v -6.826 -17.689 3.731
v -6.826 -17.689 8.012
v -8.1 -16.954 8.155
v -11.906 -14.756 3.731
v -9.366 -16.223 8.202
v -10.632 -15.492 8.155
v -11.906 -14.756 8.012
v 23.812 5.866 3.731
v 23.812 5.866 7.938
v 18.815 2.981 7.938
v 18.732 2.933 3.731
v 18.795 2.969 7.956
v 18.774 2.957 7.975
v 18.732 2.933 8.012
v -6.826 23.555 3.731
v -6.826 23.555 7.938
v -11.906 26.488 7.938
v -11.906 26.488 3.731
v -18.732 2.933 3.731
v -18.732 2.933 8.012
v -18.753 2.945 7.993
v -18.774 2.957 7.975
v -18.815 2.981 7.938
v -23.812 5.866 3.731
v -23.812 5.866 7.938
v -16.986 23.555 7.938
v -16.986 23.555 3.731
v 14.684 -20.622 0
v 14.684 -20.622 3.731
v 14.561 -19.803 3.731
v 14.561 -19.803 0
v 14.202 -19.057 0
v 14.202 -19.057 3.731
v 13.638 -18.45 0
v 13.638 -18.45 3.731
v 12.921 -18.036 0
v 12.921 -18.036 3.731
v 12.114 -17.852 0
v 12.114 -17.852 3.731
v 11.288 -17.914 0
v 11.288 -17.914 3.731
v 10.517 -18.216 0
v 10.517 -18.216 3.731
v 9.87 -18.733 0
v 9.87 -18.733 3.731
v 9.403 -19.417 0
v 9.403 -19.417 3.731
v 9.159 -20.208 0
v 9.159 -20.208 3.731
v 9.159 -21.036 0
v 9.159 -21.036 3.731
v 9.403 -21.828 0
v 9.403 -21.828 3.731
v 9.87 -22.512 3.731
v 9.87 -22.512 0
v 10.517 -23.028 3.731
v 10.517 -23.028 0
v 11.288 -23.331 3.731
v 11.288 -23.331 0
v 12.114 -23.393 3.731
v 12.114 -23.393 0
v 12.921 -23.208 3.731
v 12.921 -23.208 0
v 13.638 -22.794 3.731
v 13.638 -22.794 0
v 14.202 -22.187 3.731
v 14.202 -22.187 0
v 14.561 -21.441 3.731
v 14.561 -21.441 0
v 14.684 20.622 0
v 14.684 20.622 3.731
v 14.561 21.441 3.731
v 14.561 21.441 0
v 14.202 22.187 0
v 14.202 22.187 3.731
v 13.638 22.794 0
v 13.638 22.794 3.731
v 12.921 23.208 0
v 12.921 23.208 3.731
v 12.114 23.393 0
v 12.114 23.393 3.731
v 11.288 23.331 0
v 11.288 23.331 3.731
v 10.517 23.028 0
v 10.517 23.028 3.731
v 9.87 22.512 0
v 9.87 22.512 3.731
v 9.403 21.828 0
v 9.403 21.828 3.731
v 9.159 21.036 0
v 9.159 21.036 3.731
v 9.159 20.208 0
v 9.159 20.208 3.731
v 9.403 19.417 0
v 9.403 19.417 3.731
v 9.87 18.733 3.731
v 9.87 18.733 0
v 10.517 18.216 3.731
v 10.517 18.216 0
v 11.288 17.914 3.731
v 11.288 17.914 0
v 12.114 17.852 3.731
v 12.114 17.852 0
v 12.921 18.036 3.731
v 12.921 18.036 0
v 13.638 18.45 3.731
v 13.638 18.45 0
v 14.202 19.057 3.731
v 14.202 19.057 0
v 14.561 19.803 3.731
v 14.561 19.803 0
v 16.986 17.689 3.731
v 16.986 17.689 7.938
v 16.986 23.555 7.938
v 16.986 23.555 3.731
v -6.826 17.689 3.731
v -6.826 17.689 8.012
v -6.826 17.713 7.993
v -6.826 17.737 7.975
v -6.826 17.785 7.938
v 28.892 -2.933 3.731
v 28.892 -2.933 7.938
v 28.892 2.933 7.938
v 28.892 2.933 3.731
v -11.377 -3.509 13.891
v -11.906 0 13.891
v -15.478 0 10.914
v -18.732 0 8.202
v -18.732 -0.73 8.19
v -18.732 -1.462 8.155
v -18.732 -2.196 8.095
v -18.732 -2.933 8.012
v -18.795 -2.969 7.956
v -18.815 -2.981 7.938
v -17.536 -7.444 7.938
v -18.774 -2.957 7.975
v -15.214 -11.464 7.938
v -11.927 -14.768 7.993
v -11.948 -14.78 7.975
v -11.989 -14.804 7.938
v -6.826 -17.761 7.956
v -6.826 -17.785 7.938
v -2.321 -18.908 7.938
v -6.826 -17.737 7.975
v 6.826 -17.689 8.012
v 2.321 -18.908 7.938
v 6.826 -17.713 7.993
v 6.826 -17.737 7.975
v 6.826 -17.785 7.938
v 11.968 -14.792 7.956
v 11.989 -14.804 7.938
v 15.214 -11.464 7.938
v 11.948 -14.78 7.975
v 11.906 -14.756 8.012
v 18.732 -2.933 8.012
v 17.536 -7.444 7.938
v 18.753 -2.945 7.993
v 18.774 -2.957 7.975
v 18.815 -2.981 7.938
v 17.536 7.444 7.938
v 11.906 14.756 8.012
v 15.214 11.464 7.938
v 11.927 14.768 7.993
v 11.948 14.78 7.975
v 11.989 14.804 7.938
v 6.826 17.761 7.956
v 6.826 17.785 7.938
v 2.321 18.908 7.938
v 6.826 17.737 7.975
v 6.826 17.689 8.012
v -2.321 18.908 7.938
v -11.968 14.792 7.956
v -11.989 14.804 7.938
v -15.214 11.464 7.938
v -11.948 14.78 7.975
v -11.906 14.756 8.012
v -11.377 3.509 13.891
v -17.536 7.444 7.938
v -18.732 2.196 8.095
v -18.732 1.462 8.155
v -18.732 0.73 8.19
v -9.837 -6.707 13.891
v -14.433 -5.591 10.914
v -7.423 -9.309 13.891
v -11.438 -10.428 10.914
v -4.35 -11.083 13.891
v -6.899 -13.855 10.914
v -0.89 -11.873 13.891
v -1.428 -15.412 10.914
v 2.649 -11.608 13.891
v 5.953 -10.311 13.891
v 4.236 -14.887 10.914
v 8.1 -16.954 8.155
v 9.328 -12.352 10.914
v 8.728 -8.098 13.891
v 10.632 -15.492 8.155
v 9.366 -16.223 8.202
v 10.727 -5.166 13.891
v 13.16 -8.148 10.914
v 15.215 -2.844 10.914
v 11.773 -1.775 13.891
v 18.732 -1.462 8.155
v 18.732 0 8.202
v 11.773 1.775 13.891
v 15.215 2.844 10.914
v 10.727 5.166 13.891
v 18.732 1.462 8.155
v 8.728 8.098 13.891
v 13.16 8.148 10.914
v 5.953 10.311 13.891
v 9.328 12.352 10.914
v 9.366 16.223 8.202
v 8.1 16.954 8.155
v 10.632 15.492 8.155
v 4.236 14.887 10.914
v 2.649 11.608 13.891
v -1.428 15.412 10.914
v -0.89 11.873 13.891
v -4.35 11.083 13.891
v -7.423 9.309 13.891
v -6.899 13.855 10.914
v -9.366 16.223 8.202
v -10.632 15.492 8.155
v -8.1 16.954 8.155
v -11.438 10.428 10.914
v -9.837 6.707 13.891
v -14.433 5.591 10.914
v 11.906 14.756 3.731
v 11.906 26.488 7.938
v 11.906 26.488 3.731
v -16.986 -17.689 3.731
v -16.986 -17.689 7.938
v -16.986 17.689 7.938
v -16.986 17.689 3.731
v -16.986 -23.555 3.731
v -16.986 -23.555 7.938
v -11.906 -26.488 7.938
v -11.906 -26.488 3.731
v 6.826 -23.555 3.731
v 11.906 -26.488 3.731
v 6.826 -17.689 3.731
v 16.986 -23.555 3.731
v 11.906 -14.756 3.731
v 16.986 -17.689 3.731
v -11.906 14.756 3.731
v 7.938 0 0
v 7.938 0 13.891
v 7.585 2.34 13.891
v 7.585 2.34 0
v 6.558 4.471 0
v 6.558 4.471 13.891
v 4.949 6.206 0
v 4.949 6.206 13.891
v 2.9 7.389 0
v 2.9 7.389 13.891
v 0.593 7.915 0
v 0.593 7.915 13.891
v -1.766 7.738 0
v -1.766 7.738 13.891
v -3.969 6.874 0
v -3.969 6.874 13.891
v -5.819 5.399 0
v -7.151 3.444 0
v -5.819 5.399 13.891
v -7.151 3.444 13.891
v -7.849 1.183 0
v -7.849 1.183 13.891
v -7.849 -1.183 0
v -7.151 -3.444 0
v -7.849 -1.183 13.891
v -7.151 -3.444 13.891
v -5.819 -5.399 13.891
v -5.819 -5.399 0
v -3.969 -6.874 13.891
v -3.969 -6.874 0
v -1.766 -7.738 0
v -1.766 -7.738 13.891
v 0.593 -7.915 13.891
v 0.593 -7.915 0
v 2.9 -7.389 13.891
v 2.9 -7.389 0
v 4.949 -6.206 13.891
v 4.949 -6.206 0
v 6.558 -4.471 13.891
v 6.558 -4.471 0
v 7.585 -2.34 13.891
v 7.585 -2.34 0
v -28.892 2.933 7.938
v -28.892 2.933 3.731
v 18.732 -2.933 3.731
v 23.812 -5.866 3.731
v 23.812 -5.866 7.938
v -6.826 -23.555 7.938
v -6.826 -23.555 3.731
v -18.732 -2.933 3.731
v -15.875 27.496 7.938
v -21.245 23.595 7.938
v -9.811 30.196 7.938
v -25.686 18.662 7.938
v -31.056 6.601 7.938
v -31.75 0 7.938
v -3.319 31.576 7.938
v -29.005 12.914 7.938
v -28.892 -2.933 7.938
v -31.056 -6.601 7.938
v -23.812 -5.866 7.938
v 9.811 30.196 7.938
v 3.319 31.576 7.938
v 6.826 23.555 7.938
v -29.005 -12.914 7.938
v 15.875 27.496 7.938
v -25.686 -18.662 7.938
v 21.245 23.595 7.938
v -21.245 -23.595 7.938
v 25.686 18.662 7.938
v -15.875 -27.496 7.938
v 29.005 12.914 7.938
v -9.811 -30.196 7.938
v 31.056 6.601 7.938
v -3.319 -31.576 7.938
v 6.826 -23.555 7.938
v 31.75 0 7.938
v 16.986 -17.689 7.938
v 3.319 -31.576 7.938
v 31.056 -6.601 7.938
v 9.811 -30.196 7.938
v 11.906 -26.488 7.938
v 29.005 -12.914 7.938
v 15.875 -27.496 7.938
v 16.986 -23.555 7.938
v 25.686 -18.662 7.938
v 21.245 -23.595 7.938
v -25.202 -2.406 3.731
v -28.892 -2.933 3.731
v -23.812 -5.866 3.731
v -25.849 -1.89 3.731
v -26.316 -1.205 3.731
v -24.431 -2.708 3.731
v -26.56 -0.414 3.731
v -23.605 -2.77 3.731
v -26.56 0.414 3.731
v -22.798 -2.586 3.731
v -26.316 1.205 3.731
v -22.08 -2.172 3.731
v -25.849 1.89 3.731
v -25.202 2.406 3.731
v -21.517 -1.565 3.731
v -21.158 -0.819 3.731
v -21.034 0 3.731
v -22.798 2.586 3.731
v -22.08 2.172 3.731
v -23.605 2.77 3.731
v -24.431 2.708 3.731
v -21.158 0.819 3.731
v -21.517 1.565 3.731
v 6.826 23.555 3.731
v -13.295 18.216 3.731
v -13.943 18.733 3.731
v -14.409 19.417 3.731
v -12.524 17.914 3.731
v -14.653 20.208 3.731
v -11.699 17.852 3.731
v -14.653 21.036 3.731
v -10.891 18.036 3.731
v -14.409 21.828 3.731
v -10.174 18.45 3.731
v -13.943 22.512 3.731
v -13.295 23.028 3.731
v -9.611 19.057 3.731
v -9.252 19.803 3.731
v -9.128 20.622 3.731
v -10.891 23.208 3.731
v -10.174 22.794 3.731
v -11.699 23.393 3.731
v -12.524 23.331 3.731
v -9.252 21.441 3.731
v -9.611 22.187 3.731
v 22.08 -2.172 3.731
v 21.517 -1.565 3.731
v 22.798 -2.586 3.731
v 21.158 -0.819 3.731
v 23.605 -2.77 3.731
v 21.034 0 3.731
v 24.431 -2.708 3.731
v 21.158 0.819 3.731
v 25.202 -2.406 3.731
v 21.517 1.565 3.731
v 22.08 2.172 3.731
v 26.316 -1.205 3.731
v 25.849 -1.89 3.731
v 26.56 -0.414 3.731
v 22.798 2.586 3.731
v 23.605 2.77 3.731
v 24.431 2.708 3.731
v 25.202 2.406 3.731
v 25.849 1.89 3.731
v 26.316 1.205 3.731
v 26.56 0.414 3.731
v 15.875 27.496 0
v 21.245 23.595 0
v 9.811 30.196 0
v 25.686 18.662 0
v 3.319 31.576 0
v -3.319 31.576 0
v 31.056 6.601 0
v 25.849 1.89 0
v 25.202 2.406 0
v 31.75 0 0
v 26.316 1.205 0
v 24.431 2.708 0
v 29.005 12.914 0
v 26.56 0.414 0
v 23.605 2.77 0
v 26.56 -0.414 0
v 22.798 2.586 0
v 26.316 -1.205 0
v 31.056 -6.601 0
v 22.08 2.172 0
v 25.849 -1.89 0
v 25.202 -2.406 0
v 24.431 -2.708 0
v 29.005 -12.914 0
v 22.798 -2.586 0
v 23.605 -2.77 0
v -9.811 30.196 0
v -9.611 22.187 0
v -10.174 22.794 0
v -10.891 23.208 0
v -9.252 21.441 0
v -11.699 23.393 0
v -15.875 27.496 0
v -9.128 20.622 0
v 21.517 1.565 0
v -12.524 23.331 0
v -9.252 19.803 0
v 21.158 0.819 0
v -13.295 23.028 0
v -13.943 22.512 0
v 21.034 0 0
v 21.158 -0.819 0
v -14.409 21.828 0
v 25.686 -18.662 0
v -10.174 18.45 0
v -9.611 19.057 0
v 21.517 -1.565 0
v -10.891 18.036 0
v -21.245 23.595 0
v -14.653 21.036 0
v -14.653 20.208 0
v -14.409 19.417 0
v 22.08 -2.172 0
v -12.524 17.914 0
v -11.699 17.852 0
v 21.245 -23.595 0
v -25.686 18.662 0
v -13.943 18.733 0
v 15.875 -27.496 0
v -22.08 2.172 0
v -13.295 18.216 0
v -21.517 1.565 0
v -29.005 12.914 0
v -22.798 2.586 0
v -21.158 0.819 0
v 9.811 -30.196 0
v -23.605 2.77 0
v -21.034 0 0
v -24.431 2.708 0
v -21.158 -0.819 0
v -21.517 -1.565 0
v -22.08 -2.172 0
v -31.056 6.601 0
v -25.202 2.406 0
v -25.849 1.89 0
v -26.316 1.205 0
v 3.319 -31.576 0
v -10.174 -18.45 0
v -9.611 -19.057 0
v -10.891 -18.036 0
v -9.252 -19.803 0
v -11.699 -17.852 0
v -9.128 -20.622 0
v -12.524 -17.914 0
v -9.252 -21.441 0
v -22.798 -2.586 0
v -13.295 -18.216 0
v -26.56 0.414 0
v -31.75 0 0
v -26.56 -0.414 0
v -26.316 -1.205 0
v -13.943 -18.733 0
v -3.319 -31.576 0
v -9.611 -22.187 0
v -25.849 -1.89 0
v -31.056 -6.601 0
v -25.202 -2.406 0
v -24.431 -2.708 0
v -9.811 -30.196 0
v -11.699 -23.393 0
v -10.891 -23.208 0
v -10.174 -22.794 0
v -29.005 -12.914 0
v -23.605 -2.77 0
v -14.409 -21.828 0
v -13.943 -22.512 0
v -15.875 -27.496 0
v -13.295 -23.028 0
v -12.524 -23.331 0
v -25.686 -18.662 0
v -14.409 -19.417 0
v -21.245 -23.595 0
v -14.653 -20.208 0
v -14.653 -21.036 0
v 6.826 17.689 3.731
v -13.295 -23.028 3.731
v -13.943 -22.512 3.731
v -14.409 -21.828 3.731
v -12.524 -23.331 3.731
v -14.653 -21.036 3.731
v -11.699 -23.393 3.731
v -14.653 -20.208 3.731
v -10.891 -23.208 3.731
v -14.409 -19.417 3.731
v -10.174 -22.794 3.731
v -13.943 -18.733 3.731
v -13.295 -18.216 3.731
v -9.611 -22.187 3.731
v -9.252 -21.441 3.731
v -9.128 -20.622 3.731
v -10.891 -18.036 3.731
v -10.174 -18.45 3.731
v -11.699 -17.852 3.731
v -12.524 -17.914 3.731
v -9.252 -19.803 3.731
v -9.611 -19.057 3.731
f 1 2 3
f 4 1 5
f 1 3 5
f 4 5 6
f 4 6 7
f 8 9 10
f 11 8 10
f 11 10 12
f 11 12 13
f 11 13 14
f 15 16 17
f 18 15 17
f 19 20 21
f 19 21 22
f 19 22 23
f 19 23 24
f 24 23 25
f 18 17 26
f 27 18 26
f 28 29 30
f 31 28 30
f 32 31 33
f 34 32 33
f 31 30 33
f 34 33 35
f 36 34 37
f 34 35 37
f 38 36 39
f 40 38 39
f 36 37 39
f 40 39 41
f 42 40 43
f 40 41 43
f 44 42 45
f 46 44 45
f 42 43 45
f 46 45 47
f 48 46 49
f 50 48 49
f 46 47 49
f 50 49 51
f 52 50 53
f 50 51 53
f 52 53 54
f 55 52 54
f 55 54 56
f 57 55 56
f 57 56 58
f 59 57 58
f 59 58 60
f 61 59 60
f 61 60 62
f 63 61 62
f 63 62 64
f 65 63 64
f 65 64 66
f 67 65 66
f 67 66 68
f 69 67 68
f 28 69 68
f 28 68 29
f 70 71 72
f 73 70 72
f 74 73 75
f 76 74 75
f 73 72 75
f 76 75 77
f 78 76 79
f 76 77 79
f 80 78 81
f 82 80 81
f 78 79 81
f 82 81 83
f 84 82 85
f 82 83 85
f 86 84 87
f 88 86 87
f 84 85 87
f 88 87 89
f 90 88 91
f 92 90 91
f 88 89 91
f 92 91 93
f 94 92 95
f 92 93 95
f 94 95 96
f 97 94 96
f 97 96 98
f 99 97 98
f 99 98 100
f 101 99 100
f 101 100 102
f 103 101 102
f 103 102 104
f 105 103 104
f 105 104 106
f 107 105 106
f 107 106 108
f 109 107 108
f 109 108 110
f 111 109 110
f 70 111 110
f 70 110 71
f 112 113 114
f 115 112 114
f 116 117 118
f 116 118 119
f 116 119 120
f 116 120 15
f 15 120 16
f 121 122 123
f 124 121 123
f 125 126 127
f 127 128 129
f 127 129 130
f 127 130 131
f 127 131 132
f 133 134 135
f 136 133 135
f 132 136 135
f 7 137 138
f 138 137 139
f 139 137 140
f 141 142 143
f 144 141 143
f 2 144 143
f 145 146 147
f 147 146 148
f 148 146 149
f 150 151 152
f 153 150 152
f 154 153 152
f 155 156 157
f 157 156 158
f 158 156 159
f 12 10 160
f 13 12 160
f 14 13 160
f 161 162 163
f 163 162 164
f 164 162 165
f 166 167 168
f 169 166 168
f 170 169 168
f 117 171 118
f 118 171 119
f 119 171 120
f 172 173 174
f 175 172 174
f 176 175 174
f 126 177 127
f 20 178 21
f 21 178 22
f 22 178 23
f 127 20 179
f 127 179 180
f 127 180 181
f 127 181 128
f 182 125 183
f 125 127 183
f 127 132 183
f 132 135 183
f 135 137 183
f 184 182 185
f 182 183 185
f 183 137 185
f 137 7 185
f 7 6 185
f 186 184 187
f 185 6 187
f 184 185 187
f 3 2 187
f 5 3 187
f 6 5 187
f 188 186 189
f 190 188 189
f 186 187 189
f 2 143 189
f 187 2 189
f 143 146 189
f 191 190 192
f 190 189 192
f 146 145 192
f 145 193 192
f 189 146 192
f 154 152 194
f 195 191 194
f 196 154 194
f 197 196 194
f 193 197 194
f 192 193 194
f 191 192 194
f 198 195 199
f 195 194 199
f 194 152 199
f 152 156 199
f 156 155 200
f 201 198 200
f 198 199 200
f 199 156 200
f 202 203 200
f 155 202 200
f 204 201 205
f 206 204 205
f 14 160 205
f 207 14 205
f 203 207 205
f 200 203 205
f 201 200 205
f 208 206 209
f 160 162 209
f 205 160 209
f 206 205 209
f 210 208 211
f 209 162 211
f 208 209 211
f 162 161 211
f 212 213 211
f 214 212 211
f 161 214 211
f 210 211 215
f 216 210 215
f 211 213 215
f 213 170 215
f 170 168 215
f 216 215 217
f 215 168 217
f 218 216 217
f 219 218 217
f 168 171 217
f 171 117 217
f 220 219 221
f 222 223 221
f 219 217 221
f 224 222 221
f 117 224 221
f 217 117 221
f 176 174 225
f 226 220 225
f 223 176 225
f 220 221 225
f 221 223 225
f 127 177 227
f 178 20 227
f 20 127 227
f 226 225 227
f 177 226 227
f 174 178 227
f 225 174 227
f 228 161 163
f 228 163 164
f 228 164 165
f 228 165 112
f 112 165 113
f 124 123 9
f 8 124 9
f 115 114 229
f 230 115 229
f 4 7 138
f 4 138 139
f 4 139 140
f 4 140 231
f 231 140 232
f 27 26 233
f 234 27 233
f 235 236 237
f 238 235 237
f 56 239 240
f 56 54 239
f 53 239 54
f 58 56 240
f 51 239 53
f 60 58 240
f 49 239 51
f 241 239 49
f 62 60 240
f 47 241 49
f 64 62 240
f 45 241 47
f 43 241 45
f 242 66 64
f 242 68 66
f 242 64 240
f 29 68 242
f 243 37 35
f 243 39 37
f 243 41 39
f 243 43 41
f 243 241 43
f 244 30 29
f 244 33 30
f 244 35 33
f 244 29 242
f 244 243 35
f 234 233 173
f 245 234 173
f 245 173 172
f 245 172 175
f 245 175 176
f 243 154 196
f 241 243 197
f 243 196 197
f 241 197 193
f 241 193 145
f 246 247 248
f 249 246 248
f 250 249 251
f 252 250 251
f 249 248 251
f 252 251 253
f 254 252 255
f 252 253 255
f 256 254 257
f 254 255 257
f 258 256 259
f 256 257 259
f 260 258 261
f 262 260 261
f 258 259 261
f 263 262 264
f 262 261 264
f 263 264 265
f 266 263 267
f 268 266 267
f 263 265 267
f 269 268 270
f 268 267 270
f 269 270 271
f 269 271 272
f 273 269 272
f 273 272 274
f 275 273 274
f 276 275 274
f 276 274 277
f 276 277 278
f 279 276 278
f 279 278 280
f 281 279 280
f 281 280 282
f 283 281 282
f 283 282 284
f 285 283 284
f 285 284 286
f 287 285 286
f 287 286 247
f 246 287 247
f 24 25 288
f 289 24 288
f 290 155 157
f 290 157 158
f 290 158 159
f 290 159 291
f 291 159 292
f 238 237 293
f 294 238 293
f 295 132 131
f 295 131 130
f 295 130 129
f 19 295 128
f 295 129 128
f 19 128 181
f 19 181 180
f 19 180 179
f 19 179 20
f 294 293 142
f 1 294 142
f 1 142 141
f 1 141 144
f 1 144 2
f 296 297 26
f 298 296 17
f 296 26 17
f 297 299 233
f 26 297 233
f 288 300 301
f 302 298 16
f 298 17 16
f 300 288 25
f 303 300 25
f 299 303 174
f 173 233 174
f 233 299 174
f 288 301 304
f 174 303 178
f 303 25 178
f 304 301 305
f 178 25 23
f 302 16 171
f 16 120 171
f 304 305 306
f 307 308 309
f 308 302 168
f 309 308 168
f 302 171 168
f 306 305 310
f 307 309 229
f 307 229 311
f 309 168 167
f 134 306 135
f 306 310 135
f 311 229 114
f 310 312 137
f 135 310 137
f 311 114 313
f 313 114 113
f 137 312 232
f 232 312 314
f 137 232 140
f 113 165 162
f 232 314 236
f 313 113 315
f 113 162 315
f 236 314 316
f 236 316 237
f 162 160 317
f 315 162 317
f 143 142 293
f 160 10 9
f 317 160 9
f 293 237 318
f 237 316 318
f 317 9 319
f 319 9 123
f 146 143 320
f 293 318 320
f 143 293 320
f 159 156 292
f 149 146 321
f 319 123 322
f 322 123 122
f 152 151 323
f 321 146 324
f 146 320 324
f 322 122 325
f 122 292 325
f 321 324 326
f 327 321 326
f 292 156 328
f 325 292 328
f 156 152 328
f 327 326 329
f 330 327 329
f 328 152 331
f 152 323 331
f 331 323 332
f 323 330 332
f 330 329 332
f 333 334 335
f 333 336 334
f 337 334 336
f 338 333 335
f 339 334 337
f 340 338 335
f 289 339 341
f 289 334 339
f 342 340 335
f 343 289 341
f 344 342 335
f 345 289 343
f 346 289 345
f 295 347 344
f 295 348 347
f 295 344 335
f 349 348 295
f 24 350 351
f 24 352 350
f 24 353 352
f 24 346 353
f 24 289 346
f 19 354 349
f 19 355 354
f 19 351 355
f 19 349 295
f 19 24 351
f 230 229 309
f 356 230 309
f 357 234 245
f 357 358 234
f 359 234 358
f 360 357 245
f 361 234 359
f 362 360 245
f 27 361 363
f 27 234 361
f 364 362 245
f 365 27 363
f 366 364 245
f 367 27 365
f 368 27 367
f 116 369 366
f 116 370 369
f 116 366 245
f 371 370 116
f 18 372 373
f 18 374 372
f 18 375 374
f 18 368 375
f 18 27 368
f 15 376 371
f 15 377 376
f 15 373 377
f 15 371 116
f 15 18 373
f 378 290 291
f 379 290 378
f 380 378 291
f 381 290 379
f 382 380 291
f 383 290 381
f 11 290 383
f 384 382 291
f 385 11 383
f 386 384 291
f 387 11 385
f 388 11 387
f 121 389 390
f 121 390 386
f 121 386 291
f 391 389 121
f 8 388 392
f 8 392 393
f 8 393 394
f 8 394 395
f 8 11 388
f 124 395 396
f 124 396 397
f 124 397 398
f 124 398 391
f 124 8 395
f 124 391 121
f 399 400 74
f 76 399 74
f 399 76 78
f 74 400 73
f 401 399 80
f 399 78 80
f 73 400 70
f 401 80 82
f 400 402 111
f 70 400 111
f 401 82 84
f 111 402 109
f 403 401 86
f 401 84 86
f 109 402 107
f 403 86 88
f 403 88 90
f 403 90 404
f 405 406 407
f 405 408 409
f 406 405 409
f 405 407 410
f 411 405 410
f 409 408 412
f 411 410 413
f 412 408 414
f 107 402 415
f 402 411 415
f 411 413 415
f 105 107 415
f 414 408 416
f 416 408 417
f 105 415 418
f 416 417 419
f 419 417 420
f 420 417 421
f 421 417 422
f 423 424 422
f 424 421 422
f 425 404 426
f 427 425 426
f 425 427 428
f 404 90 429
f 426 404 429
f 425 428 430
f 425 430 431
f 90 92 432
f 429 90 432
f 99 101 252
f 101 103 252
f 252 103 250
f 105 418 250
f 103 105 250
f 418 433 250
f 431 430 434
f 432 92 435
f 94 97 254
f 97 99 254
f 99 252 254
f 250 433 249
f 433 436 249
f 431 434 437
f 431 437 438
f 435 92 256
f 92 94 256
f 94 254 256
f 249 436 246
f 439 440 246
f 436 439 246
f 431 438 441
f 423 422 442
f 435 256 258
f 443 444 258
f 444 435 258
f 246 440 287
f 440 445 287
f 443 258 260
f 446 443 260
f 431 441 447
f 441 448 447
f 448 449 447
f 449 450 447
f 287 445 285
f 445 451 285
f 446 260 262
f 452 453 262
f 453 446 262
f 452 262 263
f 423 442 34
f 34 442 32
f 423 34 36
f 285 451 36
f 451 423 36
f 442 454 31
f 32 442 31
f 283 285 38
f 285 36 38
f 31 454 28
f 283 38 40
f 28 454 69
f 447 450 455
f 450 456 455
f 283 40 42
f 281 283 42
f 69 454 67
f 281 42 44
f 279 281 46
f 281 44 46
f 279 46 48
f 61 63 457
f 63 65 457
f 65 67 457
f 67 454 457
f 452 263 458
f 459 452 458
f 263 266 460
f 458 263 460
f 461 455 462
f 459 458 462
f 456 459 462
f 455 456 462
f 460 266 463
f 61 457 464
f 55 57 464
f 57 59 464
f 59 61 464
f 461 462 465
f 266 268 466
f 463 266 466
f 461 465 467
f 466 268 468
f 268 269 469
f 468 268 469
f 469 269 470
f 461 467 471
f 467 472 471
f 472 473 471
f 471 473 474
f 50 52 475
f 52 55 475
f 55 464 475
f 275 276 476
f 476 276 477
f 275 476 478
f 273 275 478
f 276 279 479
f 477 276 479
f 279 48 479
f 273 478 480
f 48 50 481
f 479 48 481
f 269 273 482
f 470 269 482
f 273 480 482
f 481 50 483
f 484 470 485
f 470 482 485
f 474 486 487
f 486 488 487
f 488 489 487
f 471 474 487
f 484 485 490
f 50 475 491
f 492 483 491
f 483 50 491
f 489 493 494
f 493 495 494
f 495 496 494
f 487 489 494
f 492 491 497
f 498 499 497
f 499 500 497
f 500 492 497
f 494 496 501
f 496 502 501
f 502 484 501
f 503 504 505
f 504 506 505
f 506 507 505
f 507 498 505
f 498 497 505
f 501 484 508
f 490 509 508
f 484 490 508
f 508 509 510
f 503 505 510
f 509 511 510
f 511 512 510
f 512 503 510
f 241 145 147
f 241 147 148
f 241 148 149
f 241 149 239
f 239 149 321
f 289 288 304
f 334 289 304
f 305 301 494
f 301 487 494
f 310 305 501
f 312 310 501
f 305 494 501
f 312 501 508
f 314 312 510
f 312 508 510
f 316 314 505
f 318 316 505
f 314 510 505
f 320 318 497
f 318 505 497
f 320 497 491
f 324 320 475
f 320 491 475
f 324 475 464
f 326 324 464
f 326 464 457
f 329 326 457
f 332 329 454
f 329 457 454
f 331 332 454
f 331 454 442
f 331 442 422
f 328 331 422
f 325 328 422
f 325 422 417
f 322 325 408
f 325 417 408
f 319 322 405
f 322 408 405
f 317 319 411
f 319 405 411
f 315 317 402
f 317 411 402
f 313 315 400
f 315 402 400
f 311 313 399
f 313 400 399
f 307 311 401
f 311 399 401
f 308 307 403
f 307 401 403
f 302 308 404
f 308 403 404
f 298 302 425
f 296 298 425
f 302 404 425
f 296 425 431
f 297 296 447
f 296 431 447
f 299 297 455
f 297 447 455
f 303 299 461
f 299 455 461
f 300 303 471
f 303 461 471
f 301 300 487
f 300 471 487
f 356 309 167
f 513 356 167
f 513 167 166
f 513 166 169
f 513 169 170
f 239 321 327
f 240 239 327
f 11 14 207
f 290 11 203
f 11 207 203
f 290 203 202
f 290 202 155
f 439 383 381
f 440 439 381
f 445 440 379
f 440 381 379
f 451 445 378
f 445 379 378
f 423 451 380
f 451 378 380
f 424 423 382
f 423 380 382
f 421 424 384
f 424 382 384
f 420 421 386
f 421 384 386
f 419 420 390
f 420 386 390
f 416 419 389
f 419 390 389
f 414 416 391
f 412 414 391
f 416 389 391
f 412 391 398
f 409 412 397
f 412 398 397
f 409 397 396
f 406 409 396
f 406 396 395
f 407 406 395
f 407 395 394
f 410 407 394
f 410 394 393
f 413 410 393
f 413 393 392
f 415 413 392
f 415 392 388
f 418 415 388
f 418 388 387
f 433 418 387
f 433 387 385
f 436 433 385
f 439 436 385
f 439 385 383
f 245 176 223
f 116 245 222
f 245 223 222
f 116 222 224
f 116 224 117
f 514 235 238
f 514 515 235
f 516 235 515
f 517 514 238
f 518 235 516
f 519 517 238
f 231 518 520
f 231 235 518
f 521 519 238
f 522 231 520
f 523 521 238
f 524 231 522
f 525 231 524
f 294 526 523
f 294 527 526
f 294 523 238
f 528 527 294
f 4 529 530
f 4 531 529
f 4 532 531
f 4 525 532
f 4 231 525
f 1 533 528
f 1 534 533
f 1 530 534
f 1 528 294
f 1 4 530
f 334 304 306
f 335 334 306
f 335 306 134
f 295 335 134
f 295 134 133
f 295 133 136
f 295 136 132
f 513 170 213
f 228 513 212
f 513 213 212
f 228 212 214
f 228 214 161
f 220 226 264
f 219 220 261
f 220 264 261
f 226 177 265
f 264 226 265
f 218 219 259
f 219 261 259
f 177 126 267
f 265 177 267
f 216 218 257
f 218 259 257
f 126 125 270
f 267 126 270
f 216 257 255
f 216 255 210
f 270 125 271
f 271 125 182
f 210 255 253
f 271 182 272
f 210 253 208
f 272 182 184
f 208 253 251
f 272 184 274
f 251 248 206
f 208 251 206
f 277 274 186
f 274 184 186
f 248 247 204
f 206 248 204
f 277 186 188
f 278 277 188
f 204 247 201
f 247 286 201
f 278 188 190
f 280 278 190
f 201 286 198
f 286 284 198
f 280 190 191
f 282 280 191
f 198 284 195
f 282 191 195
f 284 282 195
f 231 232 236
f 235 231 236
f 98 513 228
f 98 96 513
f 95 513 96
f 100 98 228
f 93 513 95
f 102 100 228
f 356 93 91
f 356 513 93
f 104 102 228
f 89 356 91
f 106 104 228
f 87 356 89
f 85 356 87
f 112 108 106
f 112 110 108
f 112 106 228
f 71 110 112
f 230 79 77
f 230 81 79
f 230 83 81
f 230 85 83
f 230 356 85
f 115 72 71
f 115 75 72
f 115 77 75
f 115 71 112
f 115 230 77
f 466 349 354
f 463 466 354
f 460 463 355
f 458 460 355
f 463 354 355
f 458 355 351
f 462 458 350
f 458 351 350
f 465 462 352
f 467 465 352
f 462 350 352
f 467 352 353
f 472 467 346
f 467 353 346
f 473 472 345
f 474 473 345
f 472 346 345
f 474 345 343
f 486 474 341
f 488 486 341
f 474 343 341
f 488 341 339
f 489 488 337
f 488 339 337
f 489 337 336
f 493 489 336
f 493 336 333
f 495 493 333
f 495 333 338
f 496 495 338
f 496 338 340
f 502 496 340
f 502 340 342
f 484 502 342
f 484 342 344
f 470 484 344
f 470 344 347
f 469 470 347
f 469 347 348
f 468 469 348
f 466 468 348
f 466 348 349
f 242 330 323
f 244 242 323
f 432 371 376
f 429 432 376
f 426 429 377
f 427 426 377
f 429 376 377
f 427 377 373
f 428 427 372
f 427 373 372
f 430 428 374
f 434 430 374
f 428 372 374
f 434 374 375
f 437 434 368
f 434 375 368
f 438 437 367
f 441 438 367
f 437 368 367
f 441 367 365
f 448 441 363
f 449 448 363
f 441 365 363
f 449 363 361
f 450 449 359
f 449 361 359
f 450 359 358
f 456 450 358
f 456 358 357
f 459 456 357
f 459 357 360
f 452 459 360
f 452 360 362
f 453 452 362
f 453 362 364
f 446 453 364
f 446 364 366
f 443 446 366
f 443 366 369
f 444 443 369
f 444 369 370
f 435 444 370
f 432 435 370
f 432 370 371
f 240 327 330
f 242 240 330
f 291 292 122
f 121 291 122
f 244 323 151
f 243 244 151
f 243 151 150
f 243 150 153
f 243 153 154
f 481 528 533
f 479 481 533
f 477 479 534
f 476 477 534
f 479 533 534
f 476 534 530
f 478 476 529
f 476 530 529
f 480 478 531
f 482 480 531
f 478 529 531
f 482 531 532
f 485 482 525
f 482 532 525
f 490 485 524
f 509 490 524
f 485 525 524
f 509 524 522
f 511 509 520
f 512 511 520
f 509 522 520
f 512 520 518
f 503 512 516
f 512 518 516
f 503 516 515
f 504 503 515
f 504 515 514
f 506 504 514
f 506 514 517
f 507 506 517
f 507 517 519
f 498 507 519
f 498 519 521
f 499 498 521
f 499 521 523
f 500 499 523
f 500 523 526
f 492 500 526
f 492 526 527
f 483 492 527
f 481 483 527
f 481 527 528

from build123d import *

# Parameters (mm, degrees)
F2_R     = 7.9375
F2_R_2   = 2.778125
F3_DEPTH = 25.4
F4_DEPTH = 10.16


with BuildPart() as f1:
    # F0 (on Front) → F1 (revolve)
    with BuildSketch(Plane.XZ):
        Polygon((-31.75, 0), (0, 0), (0, 13.890625), (-11.90625, 13.890625), (-19.05, 7.9375), (-31.75, 7.9375), align=None)
    revolve(axis=Axis((0, 0, 6.945312), (0, 0, 1)))

    # F2 (on face) → F3 (cut)
    with BuildSketch(Plane.XY.offset(13.890625)):
        Circle(F2_R)
        with Locations((-11.90625, 20.62223)):
            Circle(F2_R_2)
        with Locations((11.90625, 20.62223)):
            Circle(F2_R_2)
        with BuildLine():
            ThreePointArc((26.590625, 0), (23.8125, 2.778125), (21.034375, 0))
            ThreePointArc((21.034375, 0), (23.8125, -2.778125), (26.590625, 0))
        make_face()
        with Locations((11.90625, -20.62223)):
            Circle(F2_R_2)
        with Locations((-11.90625, -20.62223)):
            Circle(F2_R_2)
        with Locations((-23.8125, 0)):
            Circle(F2_R_2)
    extrude(amount=-F3_DEPTH, mode=Mode.SUBTRACT)

    # F2 (on face) → F4 (cut)
    with BuildSketch(Plane.XY.offset(13.890625)):
        Polygon((-16.98625, 23.555169), (-16.98625, 17.689291), (-11.90625, 14.756351), (-6.82625, 17.689291), (-6.82625, 23.555169), (-11.90625, 26.488109), align=None)
        with Locations((-11.90625, 20.62223)):
            Circle(F2_R_2, mode=Mode.SUBTRACT)
        Polygon((11.90625, 26.488109), (6.82625, 23.555169), (6.82625, 17.689291), (11.90625, 14.756351), (16.98625, 17.689291), (16.98625, 23.555169), align=None)
        with Locations((11.90625, 20.62223)):
            Circle(F2_R_2, mode=Mode.SUBTRACT)
        Polygon((18.7325, 2.932939), (18.7325, 0), (18.7325, -2.932939), (23.8125, -5.865879), (28.8925, -2.932939), (28.8925, 2.932939), (23.8125, 5.865879), align=None)
        with BuildLine():
            ThreePointArc((26.590625, 0), (23.8125, -2.778125), (21.034375, 0))
            ThreePointArc((21.034375, 0), (23.8125, 2.778125), (26.590625, 0))
        make_face(mode=Mode.SUBTRACT)
        Polygon((16.98625, -23.555169), (16.98625, -17.689291), (11.90625, -14.756351), (6.82625, -17.689291), (6.82625, -23.555169), (11.90625, -26.488109), align=None)
        with Locations((11.90625, -20.62223)):
            Circle(F2_R_2, mode=Mode.SUBTRACT)
        Polygon((-11.90625, -26.488109), (-6.82625, -23.555169), (-6.82625, -17.689291), (-11.90625, -14.756351), (-16.98625, -17.689291), (-16.98625, -23.555169), align=None)
        with Locations((-11.90625, -20.62223)):
            Circle(F2_R_2, mode=Mode.SUBTRACT)
        Polygon((-28.8925, -2.932939), (-23.8125, -5.865879), (-18.7325, -2.932939), (-18.7325, 2.932939), (-23.8125, 5.865879), (-28.8925, 2.932939), align=None)
        with Locations((-23.8125, 0)):
            Circle(F2_R_2, mode=Mode.SUBTRACT)
    extrude(amount=-F4_DEPTH, mode=Mode.SUBTRACT)


solid = f1.part
